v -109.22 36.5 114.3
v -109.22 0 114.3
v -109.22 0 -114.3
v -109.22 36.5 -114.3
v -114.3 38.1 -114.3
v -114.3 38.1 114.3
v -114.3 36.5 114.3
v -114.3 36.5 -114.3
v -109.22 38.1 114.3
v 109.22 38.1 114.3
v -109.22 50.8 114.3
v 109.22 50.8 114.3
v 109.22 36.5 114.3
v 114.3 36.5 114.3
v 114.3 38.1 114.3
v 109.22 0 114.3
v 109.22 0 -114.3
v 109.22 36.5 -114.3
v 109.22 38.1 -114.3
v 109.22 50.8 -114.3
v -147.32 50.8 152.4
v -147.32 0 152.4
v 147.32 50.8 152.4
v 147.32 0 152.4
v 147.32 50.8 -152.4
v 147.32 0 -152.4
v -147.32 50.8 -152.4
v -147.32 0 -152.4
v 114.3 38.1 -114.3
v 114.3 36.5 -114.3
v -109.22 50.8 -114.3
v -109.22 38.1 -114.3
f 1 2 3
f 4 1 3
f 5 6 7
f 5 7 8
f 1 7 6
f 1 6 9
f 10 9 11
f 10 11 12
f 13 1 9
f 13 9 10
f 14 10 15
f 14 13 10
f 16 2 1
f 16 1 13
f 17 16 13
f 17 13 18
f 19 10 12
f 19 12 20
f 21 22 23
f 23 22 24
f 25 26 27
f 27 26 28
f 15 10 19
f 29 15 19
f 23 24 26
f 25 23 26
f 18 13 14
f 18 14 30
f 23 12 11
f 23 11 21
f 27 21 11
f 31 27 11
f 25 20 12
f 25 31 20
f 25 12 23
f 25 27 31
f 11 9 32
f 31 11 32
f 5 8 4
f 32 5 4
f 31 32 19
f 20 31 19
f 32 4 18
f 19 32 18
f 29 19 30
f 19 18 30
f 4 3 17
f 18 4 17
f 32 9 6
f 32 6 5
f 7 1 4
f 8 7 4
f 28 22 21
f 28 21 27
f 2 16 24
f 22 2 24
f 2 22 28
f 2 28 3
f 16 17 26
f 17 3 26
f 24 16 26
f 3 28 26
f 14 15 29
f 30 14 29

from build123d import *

# Parameters (mm, degrees)
SKETCH2_W           = 38.1
SKETCH2_H           = 304.8
SKETCH2_W_2         = 218.44
SKETCH2_H_2         = 38.1
BOSS_EXTRUDE1_DEPTH = 50.8
SKETCH4_W           = 228.6
SKETCH4_H           = 1.6002
CUT_EXTRUDE1_DEPTH  = 5.08


with BuildPart() as part:
    # Sketch2 → Boss-Extrude1 (new body)
    with BuildSketch(Plane(origin=(0, 0, 0), x_dir=(1, 0, 0), z_dir=(0, 1, 0))):
        with Locations((-128.27, 0)):
            Rectangle(SKETCH2_W, SKETCH2_H)
        with Locations((128.27, 0)):
            Rectangle(SKETCH2_W, SKETCH2_H)
        with Locations((0, -133.35)):
            Rectangle(SKETCH2_W_2, SKETCH2_H_2)
        with Locations((0, 133.35)):
            Rectangle(SKETCH2_W_2, SKETCH2_H_2)
    extrude(amount=BOSS_EXTRUDE1_DEPTH)

    # Sketch4 → Cut-Extrude1 (cut)
    with BuildSketch(Plane(origin=(-109.22, 0, 0), x_dir=(0, 0, -1), z_dir=(1, 0, 0))):
        with Locations((0, 37.2999)):
            Rectangle(SKETCH4_W, SKETCH4_H)
    cut_extrude1 = extrude(amount=-CUT_EXTRUDE1_DEPTH, mode=Mode.SUBTRACT)

    # Mirror1: Cut-Extrude1 across plane
    add(cut_extrude1.mirror(Plane(origin=(0, 0, 0), x_dir=(0, 0, 1), z_dir=(1, 0, 0))), mode=Mode.SUBTRACT)


solid = part.part
